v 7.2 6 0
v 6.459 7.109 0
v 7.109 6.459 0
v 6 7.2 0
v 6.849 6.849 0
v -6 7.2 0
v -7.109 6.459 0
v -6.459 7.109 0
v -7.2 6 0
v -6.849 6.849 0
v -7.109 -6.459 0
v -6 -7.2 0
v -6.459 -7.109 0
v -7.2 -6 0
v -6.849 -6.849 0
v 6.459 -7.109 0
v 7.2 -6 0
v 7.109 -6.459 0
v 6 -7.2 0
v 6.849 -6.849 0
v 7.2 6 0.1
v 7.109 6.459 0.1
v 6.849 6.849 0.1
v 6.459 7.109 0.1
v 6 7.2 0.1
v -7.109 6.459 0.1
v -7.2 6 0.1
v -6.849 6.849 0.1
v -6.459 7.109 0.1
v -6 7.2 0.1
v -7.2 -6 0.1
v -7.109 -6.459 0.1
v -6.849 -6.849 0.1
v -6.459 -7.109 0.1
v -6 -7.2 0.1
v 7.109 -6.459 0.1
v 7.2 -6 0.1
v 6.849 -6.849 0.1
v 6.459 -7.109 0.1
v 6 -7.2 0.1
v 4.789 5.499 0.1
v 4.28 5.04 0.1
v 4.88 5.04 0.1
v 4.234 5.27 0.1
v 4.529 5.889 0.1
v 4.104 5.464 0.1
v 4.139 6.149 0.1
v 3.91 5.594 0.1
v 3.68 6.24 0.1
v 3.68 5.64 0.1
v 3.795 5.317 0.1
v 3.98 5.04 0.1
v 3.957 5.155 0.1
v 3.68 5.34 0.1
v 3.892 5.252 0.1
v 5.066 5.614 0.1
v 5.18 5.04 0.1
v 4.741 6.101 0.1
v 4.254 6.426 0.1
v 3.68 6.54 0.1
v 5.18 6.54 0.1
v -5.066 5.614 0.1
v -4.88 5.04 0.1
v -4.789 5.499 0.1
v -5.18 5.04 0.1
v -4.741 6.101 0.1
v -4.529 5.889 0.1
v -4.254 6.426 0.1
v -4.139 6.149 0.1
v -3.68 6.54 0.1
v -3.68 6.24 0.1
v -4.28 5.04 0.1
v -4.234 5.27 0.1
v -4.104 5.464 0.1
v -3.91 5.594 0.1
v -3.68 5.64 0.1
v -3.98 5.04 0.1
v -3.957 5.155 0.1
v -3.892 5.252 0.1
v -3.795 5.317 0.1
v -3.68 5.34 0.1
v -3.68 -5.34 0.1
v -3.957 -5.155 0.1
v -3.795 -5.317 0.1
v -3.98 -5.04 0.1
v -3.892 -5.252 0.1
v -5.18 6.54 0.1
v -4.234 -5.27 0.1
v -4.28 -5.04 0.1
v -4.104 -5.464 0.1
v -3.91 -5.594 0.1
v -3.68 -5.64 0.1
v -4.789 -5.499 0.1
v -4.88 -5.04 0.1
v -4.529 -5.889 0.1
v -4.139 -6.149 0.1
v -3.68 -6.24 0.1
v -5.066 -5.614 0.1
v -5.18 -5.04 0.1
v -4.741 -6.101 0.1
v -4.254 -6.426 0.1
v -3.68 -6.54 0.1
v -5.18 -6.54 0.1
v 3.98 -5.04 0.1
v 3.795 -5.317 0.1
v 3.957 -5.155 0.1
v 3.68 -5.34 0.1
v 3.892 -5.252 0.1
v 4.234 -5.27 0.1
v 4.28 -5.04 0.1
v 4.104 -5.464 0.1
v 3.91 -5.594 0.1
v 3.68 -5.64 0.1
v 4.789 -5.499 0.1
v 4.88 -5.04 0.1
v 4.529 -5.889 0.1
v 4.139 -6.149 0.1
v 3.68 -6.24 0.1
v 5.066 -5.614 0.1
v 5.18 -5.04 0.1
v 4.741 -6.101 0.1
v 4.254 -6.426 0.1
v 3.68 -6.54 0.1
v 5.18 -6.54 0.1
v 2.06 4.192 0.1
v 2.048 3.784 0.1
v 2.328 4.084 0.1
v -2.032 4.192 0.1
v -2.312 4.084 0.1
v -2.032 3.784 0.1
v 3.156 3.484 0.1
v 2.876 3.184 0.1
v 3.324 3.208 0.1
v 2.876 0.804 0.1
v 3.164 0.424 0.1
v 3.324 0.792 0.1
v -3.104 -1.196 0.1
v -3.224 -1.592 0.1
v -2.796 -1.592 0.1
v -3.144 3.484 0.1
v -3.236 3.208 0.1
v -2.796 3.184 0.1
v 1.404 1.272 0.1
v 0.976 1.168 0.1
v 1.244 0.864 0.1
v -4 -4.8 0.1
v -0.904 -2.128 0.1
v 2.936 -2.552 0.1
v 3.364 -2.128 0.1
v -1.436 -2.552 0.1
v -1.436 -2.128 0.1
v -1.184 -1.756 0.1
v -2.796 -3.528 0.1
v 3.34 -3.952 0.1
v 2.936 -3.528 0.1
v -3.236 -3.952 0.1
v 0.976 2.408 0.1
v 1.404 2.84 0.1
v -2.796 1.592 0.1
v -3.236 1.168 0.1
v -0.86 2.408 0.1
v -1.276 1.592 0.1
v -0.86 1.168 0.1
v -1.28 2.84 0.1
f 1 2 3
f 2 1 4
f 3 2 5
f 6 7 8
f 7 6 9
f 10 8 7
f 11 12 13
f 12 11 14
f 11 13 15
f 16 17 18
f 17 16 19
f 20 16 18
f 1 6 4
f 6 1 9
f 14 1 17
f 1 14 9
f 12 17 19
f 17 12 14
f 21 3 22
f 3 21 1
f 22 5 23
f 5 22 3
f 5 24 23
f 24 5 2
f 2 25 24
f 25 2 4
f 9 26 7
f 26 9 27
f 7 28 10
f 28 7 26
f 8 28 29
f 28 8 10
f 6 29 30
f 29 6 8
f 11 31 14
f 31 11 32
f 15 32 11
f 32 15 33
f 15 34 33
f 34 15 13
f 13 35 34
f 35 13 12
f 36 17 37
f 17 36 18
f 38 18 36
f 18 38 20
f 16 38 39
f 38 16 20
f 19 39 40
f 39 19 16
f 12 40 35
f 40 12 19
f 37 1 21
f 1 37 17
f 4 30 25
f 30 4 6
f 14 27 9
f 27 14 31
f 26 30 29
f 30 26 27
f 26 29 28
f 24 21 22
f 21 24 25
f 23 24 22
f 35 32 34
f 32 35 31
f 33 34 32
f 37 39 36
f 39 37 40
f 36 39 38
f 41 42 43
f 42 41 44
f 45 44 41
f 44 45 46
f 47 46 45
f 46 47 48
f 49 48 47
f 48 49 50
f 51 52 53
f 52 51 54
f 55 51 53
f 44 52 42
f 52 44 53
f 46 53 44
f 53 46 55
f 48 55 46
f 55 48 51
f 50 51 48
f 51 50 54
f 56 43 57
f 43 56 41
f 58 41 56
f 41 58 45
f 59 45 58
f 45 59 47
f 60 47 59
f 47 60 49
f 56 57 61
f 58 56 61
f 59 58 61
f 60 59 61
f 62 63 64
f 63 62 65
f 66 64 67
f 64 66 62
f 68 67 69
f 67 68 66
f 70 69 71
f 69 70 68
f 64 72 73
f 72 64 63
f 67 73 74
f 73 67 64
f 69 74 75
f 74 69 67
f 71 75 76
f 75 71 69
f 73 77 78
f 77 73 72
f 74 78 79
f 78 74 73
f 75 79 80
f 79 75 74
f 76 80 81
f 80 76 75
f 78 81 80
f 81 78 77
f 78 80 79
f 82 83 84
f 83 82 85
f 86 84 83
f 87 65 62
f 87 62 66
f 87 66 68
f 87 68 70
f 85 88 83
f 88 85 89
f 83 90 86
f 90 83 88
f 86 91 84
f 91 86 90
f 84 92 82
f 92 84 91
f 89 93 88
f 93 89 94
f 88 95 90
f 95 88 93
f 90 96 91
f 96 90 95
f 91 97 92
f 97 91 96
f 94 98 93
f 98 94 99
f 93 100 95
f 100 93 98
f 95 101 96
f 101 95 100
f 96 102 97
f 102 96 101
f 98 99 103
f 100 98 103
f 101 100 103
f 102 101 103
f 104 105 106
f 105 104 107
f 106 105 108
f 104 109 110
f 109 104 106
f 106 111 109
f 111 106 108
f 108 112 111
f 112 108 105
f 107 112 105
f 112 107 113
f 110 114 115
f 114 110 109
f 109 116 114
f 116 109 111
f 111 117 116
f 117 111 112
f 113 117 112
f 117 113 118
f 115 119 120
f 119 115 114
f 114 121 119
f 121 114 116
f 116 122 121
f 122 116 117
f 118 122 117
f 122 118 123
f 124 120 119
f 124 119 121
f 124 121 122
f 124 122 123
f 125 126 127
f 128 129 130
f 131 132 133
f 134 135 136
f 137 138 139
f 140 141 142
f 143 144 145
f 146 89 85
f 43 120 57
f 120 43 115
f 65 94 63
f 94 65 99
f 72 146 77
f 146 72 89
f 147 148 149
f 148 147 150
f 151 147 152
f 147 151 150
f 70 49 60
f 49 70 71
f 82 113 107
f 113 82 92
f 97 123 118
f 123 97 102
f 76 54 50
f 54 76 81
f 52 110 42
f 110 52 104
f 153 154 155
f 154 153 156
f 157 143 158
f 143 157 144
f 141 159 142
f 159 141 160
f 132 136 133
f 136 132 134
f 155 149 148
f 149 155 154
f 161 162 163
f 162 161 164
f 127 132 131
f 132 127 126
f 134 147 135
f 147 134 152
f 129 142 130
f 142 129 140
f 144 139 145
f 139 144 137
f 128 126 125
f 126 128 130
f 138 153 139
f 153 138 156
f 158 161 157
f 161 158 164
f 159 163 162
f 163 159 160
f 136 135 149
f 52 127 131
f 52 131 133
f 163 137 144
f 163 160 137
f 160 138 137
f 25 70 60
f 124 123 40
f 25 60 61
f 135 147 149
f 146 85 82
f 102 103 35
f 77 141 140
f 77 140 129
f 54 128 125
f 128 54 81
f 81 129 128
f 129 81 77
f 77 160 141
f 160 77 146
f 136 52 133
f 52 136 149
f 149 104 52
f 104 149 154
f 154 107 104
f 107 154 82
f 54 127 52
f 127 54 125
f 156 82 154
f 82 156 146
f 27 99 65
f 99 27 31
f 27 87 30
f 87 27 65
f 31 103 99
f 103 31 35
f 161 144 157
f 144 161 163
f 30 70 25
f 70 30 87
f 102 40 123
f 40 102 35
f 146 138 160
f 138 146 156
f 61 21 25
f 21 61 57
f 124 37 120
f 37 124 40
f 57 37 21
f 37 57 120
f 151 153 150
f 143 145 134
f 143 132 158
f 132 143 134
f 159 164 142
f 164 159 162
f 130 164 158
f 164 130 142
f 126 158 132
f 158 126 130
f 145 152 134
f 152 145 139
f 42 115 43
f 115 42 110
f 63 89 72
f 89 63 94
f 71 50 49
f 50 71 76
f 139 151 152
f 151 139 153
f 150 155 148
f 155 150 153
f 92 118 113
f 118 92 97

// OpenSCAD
// file: ../p/1-4cyli.scad
use <../lib.scad>
function ldraw_lib__1_4cyli() = [
// 0 Cylinder 0.25
// 0 Name: 1-4cyli.dat
// 0 Author: James Jessiman
// 0 !LDRAW_ORG Primitive UPDATE 2012-01
// 0 !LICENSE Licensed under CC BY 4.0 : see CAreadme.txt
// 
// 0 BFC CERTIFY CCW
  [0,"BFC","CERTIFY"],
  [0,"BFC","CCW"],
// 
// 0 !HISTORY 2002-03-23 [sbliss] Added BFC statement.
// 0 !HISTORY 2002-04-25 [PTadmin] Official Update 2002-02
// 0 !HISTORY 2007-06-22 [PTadmin] Header formatted for Contributor Agreement
// 0 !HISTORY 2008-07-01 [PTadmin] Official Update 2008-01
// 0 !HISTORY 2012-02-16 [Philo] Changed to CCW
// 0 !HISTORY 2012-03-30 [PTadmin] Official Update 2012-01
// 
// 
// 4 16 1 1 0 0.9239 1 0.3827 0.9239 0 0.3827 1 0 0
  [4,16,1,1,0,0.9239,1,0.3827,0.9239,0,0.3827,1,0,0],
// 5 24 1 0 0 1 1 0 0.9239 0 0.3827 1 0 -1
  [5,24,1,0,0,1,1,0,0.9239,0,0.3827,1,0,-1],
// 4 16 0.9239 1 0.3827 0.7071 1 0.7071 0.7071 0 0.7071 0.9239 0 0.3827
  [4,16,0.9239,1,0.3827,0.7071,1,0.7071,0.7071,0,0.7071,0.9239,0,0.3827],
// 5 24 0.9239 0 0.3827 0.9239 1 0.3827 0.7071 0 0.7071 1 0 0
  [5,24,0.9239,0,0.3827,0.9239,1,0.3827,0.7071,0,0.7071,1,0,0],
// 4 16 0.7071 1 0.7071 0.3827 1 0.9239 0.3827 0 0.9239 0.7071 0 0.7071
  [4,16,0.7071,1,0.7071,0.3827,1,0.9239,0.3827,0,0.9239,0.7071,0,0.7071],
// 5 24 0.7071 0 0.7071 0.7071 1 0.7071 0.3827 0 0.9239 0.9239 0 0.3827
  [5,24,0.7071,0,0.7071,0.7071,1,0.7071,0.3827,0,0.9239,0.9239,0,0.3827],
// 4 16 0.3827 1 0.9239 0 1 1 0 0 1 0.3827 0 0.9239
  [4,16,0.3827,1,0.9239,0,1,1,0,0,1,0.3827,0,0.9239],
// 5 24 0.3827 0 0.9239 0.3827 1 0.9239 0 0 1 0.7071 0 0.7071
  [5,24,0.3827,0,0.9239,0.3827,1,0.9239,0,0,1,0.7071,0,0.7071],
// 5 24 0 0 1 0 1 1 0.3827 0 0.9239 -1 0 1
  [5,24,0,0,1,0,1,1,0.3827,0,0.9239,-1,0,1],
];
module ldraw_lib__1_4cyli(step=0, col=false, unit=2/5, alt=false, line=0.2, solid=!$preview)
    makepoly(ldraw_lib__1_4cyli(), step=step, col=col, unit=unit, alt=alt, line=line, solid=solid);
ldraw_lib__1_4cyli(line=0.2);
// file: s/6237277as01.scad
use <../../lib.scad>
use <../../p/1-4chrd.scad>
use <../../p/1-4cyli.scad>
function ldraw_lib__s__6237277as01() = [
// 0 ~Sticker  1.8 x  1.8 without Top Surface
// 0 Name: s\6237277as01.dat
// 0 Author: Alex Herrera [alanbrito98]
// 0 !LDRAW_ORG Subpart UPDATE 2023-04
// 0 !LICENSE Licensed under CC BY 4.0 : see CAreadme.txt
// 
// 0 BFC CERTIFY CCW
  [0,"BFC","CERTIFY"],
  [0,"BFC","CCW"],
// 
// 0 !HISTORY 2023-08-25 [OrionP] Official Update 2023-04
// 
// 
// 0 // Bottom
// 0 // Primitives
// 1 16 15 0 15 3 0 0 0 -1 0 0 0 3 1-4chrd.dat
  [1,16,15,0,15,3,0,0,0,-1,0,0,0,3, ldraw_lib__1_4chrd()],
// 1 16 -15 0 15 -3 0 0 0 -1 0 0 0 3 1-4chrd.dat
  [1,16,-15,0,15,-3,0,0,0,-1,0,0,0,3, ldraw_lib__1_4chrd()],
// 1 16 -15 0 -15 -3 0 0 0 -1 0 0 0 -3 1-4chrd.dat
  [1,16,-15,0,-15,-3,0,0,0,-1,0,0,0,-3, ldraw_lib__1_4chrd()],
// 1 16 15 0 -15 3 0 0 0 -1 0 0 0 -3 1-4chrd.dat
  [1,16,15,0,-15,3,0,0,0,-1,0,0,0,-3, ldraw_lib__1_4chrd()],
// 0 // Bottom Faces
// 4 16 18 0 15 -18 0 15 -15 0 18 15 0 18
  [4,16,18,0,15,-18,0,15,-15,0,18,15,0,18],
// 4 16 -18 0 -15 -18 0 15 18 0 15 18 0 -15
  [4,16,-18,0,-15,-18,0,15,18,0,15,18,0,-15],
// 4 16 15 0 -18 -15 0 -18 -18 0 -15 18 0 -15
  [4,16,15,0,-18,-15,0,-18,-18,0,-15,18,0,-15],
// 0 // Sides
// 0 // Primitives
// 1 16 15 0 15 3 0 0 0 -0.25 0 0 0 3 1-4cyli.dat
  [1,16,15,0,15,3,0,0,0,-0.25,0,0,0,3, ldraw_lib__1_4cyli()],
// 1 16 -15 0 15 -3 0 0 0 -0.25 0 0 0 3 1-4cyli.dat
  [1,16,-15,0,15,-3,0,0,0,-0.25,0,0,0,3, ldraw_lib__1_4cyli()],
// 1 16 -15 0 -15 -3 0 0 0 -0.25 0 0 0 -3 1-4cyli.dat
  [1,16,-15,0,-15,-3,0,0,0,-0.25,0,0,0,-3, ldraw_lib__1_4cyli()],
// 1 16 15 0 -15 3 0 0 0 -0.25 0 0 0 -3 1-4cyli.dat
  [1,16,15,0,-15,3,0,0,0,-0.25,0,0,0,-3, ldraw_lib__1_4cyli()],
// 0 // Side Faces
// 4 16 -15 0 -18 15 0 -18 15 -0.25 -18 -15 -0.25 -18
  [4,16,-15,0,-18,15,0,-18,15,-0.25,-18,-15,-0.25,-18],
// 4 16 18 0 -15 18 0 15 18 -0.25 15 18 -0.25 -15
  [4,16,18,0,-15,18,0,15,18,-0.25,15,18,-0.25,-15],
// 4 16 15 0 18 -15 0 18 -15 -0.25 18 15 -0.25 18
  [4,16,15,0,18,-15,0,18,-15,-0.25,18,15,-0.25,18],
// 4 16 -18 0 15 -18 0 -15 -18 -0.25 -15 -18 -0.25 15
  [4,16,-18,0,15,-18,0,-15,-18,-0.25,-15,-18,-0.25,15],
// 
];
module ldraw_lib__s__6237277as01(step=0, col=false, unit=2/5, alt=false, line=0.2, solid=!$preview)
    makepoly(ldraw_lib__s__6237277as01(), step=step, col=col, unit=unit, alt=alt, line=line, solid=solid);
ldraw_lib__s__6237277as01(line=0.2);
// file: ../p/1-4ring4.scad
use <../lib.scad>
function ldraw_lib__1_4ring4() = [
// 0 Ring  4 x 0.25
// 0 Name: 1-4ring4.dat
// 0 Author: Bernd Broich [bbroich]
// 0 !LDRAW_ORG Primitive UPDATE 2012-01
// 0 !LICENSE Licensed under CC BY 2.0 and CC BY 4.0 : see CAreadme.txt
// 
// 0 BFC CERTIFY CCW
  [0,"BFC","CERTIFY"],
  [0,"BFC","CCW"],
// 
// 0 !HISTORY 2000-09-30 [PTadmin] Official Update 2000-02
// 0 !HISTORY 2003-08-01 [PTadmin] Official Update 2003-02
// 0 !HISTORY 2007-06-22 [PTadmin] Header formatted for Contributor Agreement
// 0 !HISTORY 2008-07-01 [PTadmin] Official Update 2008-01
// 0 !HISTORY 2012-02-16 [Philo] Changed to CCW
// 0 !HISTORY 2012-03-30 [PTadmin] Official Update 2012-01
// 
// 
// 4 16 5 0 0 4.6195 0 1.9135 3.6956 0 1.5308 4 0 0
  [4,16,5,0,0,4.6195,0,1.9135,3.6956,0,1.5308,4,0,0],
// 4 16 4.6195 0 1.9135 3.5355 0 3.5355 2.8284 0 2.8284 3.6956 0 1.5308
  [4,16,4.6195,0,1.9135,3.5355,0,3.5355,2.8284,0,2.8284,3.6956,0,1.5308],
// 4 16 3.5355 0 3.5355 1.9135 0 4.6195 1.5308 0 3.6956 2.8284 0 2.8284
  [4,16,3.5355,0,3.5355,1.9135,0,4.6195,1.5308,0,3.6956,2.8284,0,2.8284],
// 4 16 1.9135 0 4.6195 0 0 5 0 0 4 1.5308 0 3.6956
  [4,16,1.9135,0,4.6195,0,0,5,0,0,4,1.5308,0,3.6956],
];
module ldraw_lib__1_4ring4(step=0, col=false, unit=2/5, alt=false, line=0.2, solid=!$preview)
    makepoly(ldraw_lib__1_4ring4(), step=step, col=col, unit=unit, alt=alt, line=line, solid=solid);
ldraw_lib__1_4ring4(line=0.2);
// file: ../p/1-4ring1.scad
use <../lib.scad>
function ldraw_lib__1_4ring1() = [
// 0 Ring  1 x 0.25
// 0 Name: 1-4ring1.dat
// 0 Author: Chris Dee [cwdee]
// 0 !LDRAW_ORG Primitive UPDATE 2012-01
// 0 !LICENSE Licensed under CC BY 4.0 : see CAreadme.txt
// 
// 0 BFC CERTIFY CCW
  [0,"BFC","CERTIFY"],
  [0,"BFC","CCW"],
// 
// 0 !HISTORY 2000-05-07 [PTadmin] Official Update 2000-01
// 0 !HISTORY 2002-11-22 [hafhead] Added BFC statement
// 0 !HISTORY 2002-11-30 [PTadmin] Official Update 2002-05
// 0 !HISTORY 2007-06-22 [PTadmin] Header formatted for Contributor Agreement
// 0 !HISTORY 2008-07-01 [PTadmin] Official Update 2008-01
// 0 !HISTORY 2012-02-16 [Philo] Changed to CCW
// 0 !HISTORY 2012-03-30 [PTadmin] Official Update 2012-01
// 
// 
// 4 16 2 0 0 1.8478 0 0.7654 0.9239 0 0.3827 1 0 0
  [4,16,2,0,0,1.8478,0,0.7654,0.9239,0,0.3827,1,0,0],
// 4 16 1.8478 0 0.7654 1.4142 0 1.4142 0.7071 0 0.7071 0.9239 0 0.3827
  [4,16,1.8478,0,0.7654,1.4142,0,1.4142,0.7071,0,0.7071,0.9239,0,0.3827],
// 4 16 1.4142 0 1.4142 0.7654 0 1.8478 0.3827 0 0.9239 0.7071 0 0.7071
  [4,16,1.4142,0,1.4142,0.7654,0,1.8478,0.3827,0,0.9239,0.7071,0,0.7071],
// 4 16 0.7654 0 1.8478 0 0 2 0 0 1 0.3827 0 0.9239
  [4,16,0.7654,0,1.8478,0,0,2,0,0,1,0.3827,0,0.9239],
];
module ldraw_lib__1_4ring1(step=0, col=false, unit=2/5, alt=false, line=0.2, solid=!$preview)
    makepoly(ldraw_lib__1_4ring1(), step=step, col=col, unit=unit, alt=alt, line=line, solid=solid);
ldraw_lib__1_4ring1(line=0.2);
// file: ../p/1-4ndis.scad
use <../lib.scad>
function ldraw_lib__1_4ndis() = [
// 0 Disc Negative 0.25
// 0 Name: 1-4ndis.dat
// 0 Author: James Jessiman
// 0 !LDRAW_ORG Primitive UPDATE 2012-01
// 0 !LICENSE Licensed under CC BY 4.0 : see CAreadme.txt
// 
// 0 BFC CERTIFY CCW
  [0,"BFC","CERTIFY"],
  [0,"BFC","CCW"],
// 
// 0 !HISTORY 2002-03-23 [sbliss] Added BFC Statement
// 0 !HISTORY 2002-04-25 [PTadmin] Official Update 2002-02
// 0 !HISTORY 2007-06-22 [PTadmin] Header formatted for Contributor Agreement
// 0 !HISTORY 2008-07-01 [PTadmin] Official Update 2008-01
// 0 !HISTORY 2012-02-16 [Philo] Changed to CCW
// 0 !HISTORY 2012-03-30 [PTadmin] Official Update 2012-01
// 
// 
// 3 16 0.9239 0 0.3827 1 0 0 1 0 1
  [3,16,0.9239,0,0.3827,1,0,0,1,0,1],
// 3 16 0.7071 0 0.7071 0.9239 0 0.3827 1 0 1
  [3,16,0.7071,0,0.7071,0.9239,0,0.3827,1,0,1],
// 3 16 0.3827 0 0.9239 0.7071 0 0.7071 1 0 1
  [3,16,0.3827,0,0.9239,0.7071,0,0.7071,1,0,1],
// 3 16 0 0 1 0.3827 0 0.9239 1 0 1
  [3,16,0,0,1,0.3827,0,0.9239,1,0,1],
];
module ldraw_lib__1_4ndis(step=0, col=false, unit=2/5, alt=false, line=0.2, solid=!$preview)
    makepoly(ldraw_lib__1_4ndis(), step=step, col=col, unit=unit, alt=alt, line=line, solid=solid);
ldraw_lib__1_4ndis(line=0.2);
// file: ../p/1-4chrd.scad
use <../lib.scad>
function ldraw_lib__1_4chrd() = [
// 0 Chord 0.25
// 0 Name: 1-4chrd.dat
// 0 Author: Tony Hafner [hafhead]
// 0 !LDRAW_ORG Primitive UPDATE 2012-02
// 0 !LICENSE Licensed under CC BY 2.0 and CC BY 4.0 : see CAreadme.txt
// 
// 0 BFC CERTIFY CCW
  [0,"BFC","CERTIFY"],
  [0,"BFC","CCW"],
// 
// 0 !HISTORY 2004-04-22 [PTadmin] Official Update 2004-02
// 0 !HISTORY 2007-10-09 [PTadmin] Header formatted for Contributor Agreement
// 0 !HISTORY 2008-07-01 [PTadmin] Official Update 2008-01
// 0 !HISTORY 2012-08-02 [MMR1988] Re-creation with PrimGen2 and Rectifier
// 0 !HISTORY 2012-08-09 [PTadmin] Official Update 2012-02
// 
// 
// 4 16 0.9239 0 0.3827 0.3827 0 0.9239 0 0 1 1 0 0
  [4,16,0.9239,0,0.3827,0.3827,0,0.9239,0,0,1,1,0,0],
// 3 16 0.7071 0 0.7071 0.3827 0 0.9239 0.9239 0 0.3827
  [3,16,0.7071,0,0.7071,0.3827,0,0.9239,0.9239,0,0.3827],
];
module ldraw_lib__1_4chrd(step=0, col=false, unit=2/5, alt=false, line=0.2, solid=!$preview)
    makepoly(ldraw_lib__1_4chrd(), step=step, col=col, unit=unit, alt=alt, line=line, solid=solid);
ldraw_lib__1_4chrd(line=0.2);
// main file
use <../lib.scad>
use <../p/1-4chrd.scad>
use <../p/1-4ndis.scad>
use <../p/1-4ring1.scad>
use <../p/1-4ring4.scad>
use <s/6237277as01.scad>
function ldraw_lib__6237277b() = [
// 0 Sticker  1.8 x  1.8 with Yellow "2" on Blue Panel on Blue Background
// 0 Name: 6237277b.dat
// 0 Author: Alex Herrera [alanbrito98]
// 0 !LDRAW_ORG Part UPDATE 2023-04
// 0 !LICENSE Licensed under CC BY 4.0 : see CAreadme.txt
// 
// 0 BFC CERTIFY CCW
  [0,"BFC","CERTIFY"],
  [0,"BFC","CCW"],
// 
// 0 !KEYWORDS set 21311, Voltron
// 
// 0 !HISTORY 2023-08-25 [OrionP] Official Update 2023-04
// 
// 
// 0 // Box
// 
// 1 16 0 0 0 1 0 0 0 1 0 0 0 1 s\6237277as01.dat
  [1,16,0,0,0,1,0,0,0,1,0,0,0,1, ldraw_lib__s__6237277as01()],
// 0 // Primitives
// 1 1 -15 -0.25 15 -3 0 0 0 1 0 0 0 3 1-4chrd.dat
  [1,1,-15,-0.25,15,-3,0,0,0,1,0,0,0,3, ldraw_lib__1_4chrd()],
// 1 1 15 -0.25 15 3 0 0 0 1 0 0 0 3 1-4chrd.dat
  [1,1,15,-0.25,15,3,0,0,0,1,0,0,0,3, ldraw_lib__1_4chrd()],
// 1 1 -15 -0.25 -15 -3 0 0 0 1 0 0 0 -3 1-4chrd.dat
  [1,1,-15,-0.25,-15,-3,0,0,0,1,0,0,0,-3, ldraw_lib__1_4chrd()],
// 1 1 15 -0.25 -15 3 0 0 0 1 0 0 0 -3 1-4chrd.dat
  [1,1,15,-0.25,-15,3,0,0,0,1,0,0,0,-3, ldraw_lib__1_4chrd()],
// 1 14 9.2 -0.25 12.6 1.5 0 0 0 1 0 0 0 1.5 1-4ring1.dat
  [1,14,9.2,-0.25,12.6,1.5,0,0,0,1,0,0,0,1.5, ldraw_lib__1_4ring1()],
// 1 1 9.2 -0.25 12.6 0.75 0 0 0 1 0 0 0 0.75 1-4chrd.dat
  [1,1,9.2,-0.25,12.6,0.75,0,0,0,1,0,0,0,0.75, ldraw_lib__1_4chrd()],
// 1 0 9.2 -0.25 12.6 0.75 0 0 0 1 0 0 0 0.75 1-4ring1.dat
  [1,0,9.2,-0.25,12.6,0.75,0,0,0,1,0,0,0,0.75, ldraw_lib__1_4ring1()],
// 1 0 9.2 -0.25 12.6 0.75 0 0 0 1 0 0 0 0.75 1-4ring4.dat
  [1,0,9.2,-0.25,12.6,0.75,0,0,0,1,0,0,0,0.75, ldraw_lib__1_4ring4()],
// 1 1 9.2 -0.25 12.6 3.75 0 0 0 1 0 0 0 3.75 1-4ndis.dat
  [1,1,9.2,-0.25,12.6,3.75,0,0,0,1,0,0,0,3.75, ldraw_lib__1_4ndis()],
// 1 0 -9.2 -0.25 12.6 -0.75 0 0 0 1 0 0 0 0.75 1-4ring4.dat
  [1,0,-9.2,-0.25,12.6,-0.75,0,0,0,1,0,0,0,0.75, ldraw_lib__1_4ring4()],
// 1 14 -9.2 -0.25 12.6 -1.5 0 0 0 1 0 0 0 1.5 1-4ring1.dat
  [1,14,-9.2,-0.25,12.6,-1.5,0,0,0,1,0,0,0,1.5, ldraw_lib__1_4ring1()],
// 1 0 -9.2 -0.25 12.6 -0.75 0 0 0 1 0 0 0 0.75 1-4ring1.dat
  [1,0,-9.2,-0.25,12.6,-0.75,0,0,0,1,0,0,0,0.75, ldraw_lib__1_4ring1()],
// 1 1 -9.2 -0.25 12.6 -0.75 0 0 0 1 0 0 0 0.75 1-4chrd.dat
  [1,1,-9.2,-0.25,12.6,-0.75,0,0,0,1,0,0,0,0.75, ldraw_lib__1_4chrd()],
// 1 1 -9.2 -0.25 -12.6 -0.75 0 0 0 1 0 0 0 -0.75 1-4chrd.dat
  [1,1,-9.2,-0.25,-12.6,-0.75,0,0,0,1,0,0,0,-0.75, ldraw_lib__1_4chrd()],
// 1 1 -9.2 -0.25 12.6 -3.75 0 0 0 1 0 0 0 3.75 1-4ndis.dat
  [1,1,-9.2,-0.25,12.6,-3.75,0,0,0,1,0,0,0,3.75, ldraw_lib__1_4ndis()],
// 1 0 -9.2 -0.25 -12.6 -0.75 0 0 0 1 0 0 0 -0.75 1-4ring1.dat
  [1,0,-9.2,-0.25,-12.6,-0.75,0,0,0,1,0,0,0,-0.75, ldraw_lib__1_4ring1()],
// 1 14 -9.2 -0.25 -12.6 -1.5 0 0 0 1 0 0 0 -1.5 1-4ring1.dat
  [1,14,-9.2,-0.25,-12.6,-1.5,0,0,0,1,0,0,0,-1.5, ldraw_lib__1_4ring1()],
// 1 0 -9.2 -0.25 -12.6 -0.75 0 0 0 1 0 0 0 -0.75 1-4ring4.dat
  [1,0,-9.2,-0.25,-12.6,-0.75,0,0,0,1,0,0,0,-0.75, ldraw_lib__1_4ring4()],
// 1 1 -9.2 -0.25 -12.6 -3.75 0 0 0 1 0 0 0 -3.75 1-4ndis.dat
  [1,1,-9.2,-0.25,-12.6,-3.75,0,0,0,1,0,0,0,-3.75, ldraw_lib__1_4ndis()],
// 1 1 9.2 -0.25 -12.6 0.75 0 0 0 1 0 0 0 -0.75 1-4chrd.dat
  [1,1,9.2,-0.25,-12.6,0.75,0,0,0,1,0,0,0,-0.75, ldraw_lib__1_4chrd()],
// 1 0 9.2 -0.25 -12.6 0.75 0 0 0 1 0 0 0 -0.75 1-4ring1.dat
  [1,0,9.2,-0.25,-12.6,0.75,0,0,0,1,0,0,0,-0.75, ldraw_lib__1_4ring1()],
// 1 14 9.2 -0.25 -12.6 1.5 0 0 0 1 0 0 0 -1.5 1-4ring1.dat
  [1,14,9.2,-0.25,-12.6,1.5,0,0,0,1,0,0,0,-1.5, ldraw_lib__1_4ring1()],
// 1 0 9.2 -0.25 -12.6 0.75 0 0 0 1 0 0 0 -0.75 1-4ring4.dat
  [1,0,9.2,-0.25,-12.6,0.75,0,0,0,1,0,0,0,-0.75, ldraw_lib__1_4ring4()],
// 1 1 9.2 -0.25 -12.6 3.75 0 0 0 1 0 0 0 -3.75 1-4ndis.dat
  [1,1,9.2,-0.25,-12.6,3.75,0,0,0,1,0,0,0,-3.75, ldraw_lib__1_4ndis()],
// 0 // Pattern
// 0 // Black
// 3 0 5.15 -0.25 10.48 5.12 -0.25 9.46 5.82 -0.25 10.21
  [3,0,5.15,-0.25,10.48,5.12,-0.25,9.46,5.82,-0.25,10.21],
// 3 0 -5.08 -0.25 10.48 -5.78 -0.25 10.21 -5.08 -0.25 9.46
  [3,0,-5.08,-0.25,10.48,-5.78,-0.25,10.21,-5.08,-0.25,9.46],
// 3 0 7.89 -0.25 8.71 7.19 -0.25 7.96 8.31 -0.25 8.02
  [3,0,7.89,-0.25,8.71,7.19,-0.25,7.96,8.31,-0.25,8.02],
// 3 0 7.19 -0.25 2.01 7.91 -0.25 1.06 8.31 -0.25 1.98
  [3,0,7.19,-0.25,2.01,7.91,-0.25,1.06,8.31,-0.25,1.98],
// 3 0 -7.76 -0.25 -2.99 -8.06 -0.25 -3.98 -6.99 -0.25 -3.98
  [3,0,-7.76,-0.25,-2.99,-8.06,-0.25,-3.98,-6.99,-0.25,-3.98],
// 3 0 -7.86 -0.25 8.71 -8.09 -0.25 8.02 -6.99 -0.25 7.96
  [3,0,-7.86,-0.25,8.71,-8.09,-0.25,8.02,-6.99,-0.25,7.96],
// 3 0 3.51 -0.25 3.18 2.44 -0.25 2.92 3.11 -0.25 2.16
  [3,0,3.51,-0.25,3.18,2.44,-0.25,2.92,3.11,-0.25,2.16],
// 3 0 -10 -0.25 -12 -10.7 -0.25 -12.6 -9.95 -0.25 -12.6
  [3,0,-10,-0.25,-12,-10.7,-0.25,-12.6,-9.95,-0.25,-12.6],
// 4 0 12.2 -0.25 12.6 12.2 -0.25 -12.6 12.95 -0.25 -12.6 12.95 -0.25 12.6
  [4,0,12.2,-0.25,12.6,12.2,-0.25,-12.6,12.95,-0.25,-12.6,12.95,-0.25,12.6],
// 4 0 -12.2 -0.25 12.6 -12.95 -0.25 12.6 -12.95 -0.25 -12.6 -12.2 -0.25 -12.6
  [4,0,-12.2,-0.25,12.6,-12.95,-0.25,12.6,-12.95,-0.25,-12.6,-12.2,-0.25,-12.6],
// 4 0 -10 -0.25 -12 -9.95 -0.25 12.6 -10.7 -0.25 12.6 -10.7 -0.25 -12.6
  [4,0,-10,-0.25,-12,-9.95,-0.25,12.6,-10.7,-0.25,12.6,-10.7,-0.25,-12.6],
// 4 0 8.41 -0.25 -5.32 -2.26 -0.25 -5.32 -3.59 -0.25 -6.38 7.34 -0.25 -6.38
  [4,0,8.41,-0.25,-5.32,-2.26,-0.25,-5.32,-3.59,-0.25,-6.38,7.34,-0.25,-6.38],
// 4 0 -2.26 -0.25 -5.32 -2.96 -0.25 -4.39 -3.59 -0.25 -5.32 -3.59 -0.25 -6.38
  [4,0,-2.26,-0.25,-5.32,-2.96,-0.25,-4.39,-3.59,-0.25,-5.32,-3.59,-0.25,-6.38],
// 4 0 9.2 -0.25 15.6 9.2 -0.25 16.35 -9.2 -0.25 16.35 -9.2 -0.25 15.6
  [4,0,9.2,-0.25,15.6,9.2,-0.25,16.35,-9.2,-0.25,16.35,-9.2,-0.25,15.6],
// 4 0 9.2 -0.25 -13.35 -9.2 -0.25 -13.35 -9.2 -0.25 -14.1 9.2 -0.25 -14.1
  [4,0,9.2,-0.25,-13.35,-9.2,-0.25,-13.35,-9.2,-0.25,-14.1,9.2,-0.25,-14.1],
// 4 0 -9.2 -0.25 -16.35 9.2 -0.25 -16.35 9.2 -0.25 -15.6 -9.2 -0.25 -15.6
  [4,0,-9.2,-0.25,-16.35,9.2,-0.25,-16.35,9.2,-0.25,-15.6,-9.2,-0.25,-15.6],
// 4 0 9.2 -0.25 13.35 9.2 -0.25 14.1 -9.2 -0.25 14.1 -9.2 -0.25 13.35
  [4,0,9.2,-0.25,13.35,9.2,-0.25,14.1,-9.2,-0.25,14.1,-9.2,-0.25,13.35],
// 4 0 10.7 -0.25 -12.6 10.7 -0.25 12.6 9.95 -0.25 12.6 9.95 -0.25 -12.6
  [4,0,10.7,-0.25,-12.6,10.7,-0.25,12.6,9.95,-0.25,12.6,9.95,-0.25,-12.6],
// 4 0 -6.99 -0.25 -8.82 -8.09 -0.25 -9.88 8.35 -0.25 -9.88 7.34 -0.25 -8.82
  [4,0,-6.99,-0.25,-8.82,-8.09,-0.25,-9.88,8.35,-0.25,-9.88,7.34,-0.25,-8.82],
// 4 0 3.51 -0.25 7.1 2.44 -0.25 6.02 2.44 -0.25 2.92 3.51 -0.25 3.18
  [4,0,3.51,-0.25,7.1,2.44,-0.25,6.02,2.44,-0.25,2.92,3.51,-0.25,3.18],
// 4 0 -6.99 -0.25 7.96 -8.09 -0.25 8.02 -8.09 -0.25 2.92 -6.99 -0.25 3.98
  [4,0,-6.99,-0.25,7.96,-8.09,-0.25,8.02,-8.09,-0.25,2.92,-6.99,-0.25,3.98],
// 4 0 8.31 -0.25 8.02 7.19 -0.25 7.96 7.19 -0.25 2.01 8.31 -0.25 1.98
  [4,0,8.31,-0.25,8.02,7.19,-0.25,7.96,7.19,-0.25,2.01,8.31,-0.25,1.98],
// 4 0 8.41 -0.25 -5.32 7.34 -0.25 -6.38 7.34 -0.25 -8.82 8.35 -0.25 -9.88
  [4,0,8.41,-0.25,-5.32,7.34,-0.25,-6.38,7.34,-0.25,-8.82,8.35,-0.25,-9.88],
// 4 0 -2.15 -0.25 6.02 -3.2 -0.25 7.1 -3.19 -0.25 3.98 -2.15 -0.25 2.92
  [4,0,-2.15,-0.25,6.02,-3.2,-0.25,7.1,-3.19,-0.25,3.98,-2.15,-0.25,2.92],
// 4 0 7.89 -0.25 8.71 5.82 -0.25 10.21 5.12 -0.25 9.46 7.19 -0.25 7.96
  [4,0,7.89,-0.25,8.71,5.82,-0.25,10.21,5.12,-0.25,9.46,7.19,-0.25,7.96],
// 4 0 7.91 -0.25 1.06 7.19 -0.25 2.01 -2.96 -0.25 -4.39 -2.26 -0.25 -5.32
  [4,0,7.91,-0.25,1.06,7.19,-0.25,2.01,-2.96,-0.25,-4.39,-2.26,-0.25,-5.32],
// 4 0 -5.08 -0.25 9.46 -5.78 -0.25 10.21 -7.86 -0.25 8.71 -6.99 -0.25 7.96
  [4,0,-5.08,-0.25,9.46,-5.78,-0.25,10.21,-7.86,-0.25,8.71,-6.99,-0.25,7.96],
// 4 0 3.11 -0.25 2.16 2.44 -0.25 2.92 -7.76 -0.25 -2.99 -6.99 -0.25 -3.98
  [4,0,3.11,-0.25,2.16,2.44,-0.25,2.92,-7.76,-0.25,-2.99,-6.99,-0.25,-3.98],
// 4 0 -5.08 -0.25 10.48 -5.08 -0.25 9.46 5.12 -0.25 9.46 5.15 -0.25 10.48
  [4,0,-5.08,-0.25,10.48,-5.08,-0.25,9.46,5.12,-0.25,9.46,5.15,-0.25,10.48],
// 4 0 -8.09 -0.25 -9.88 -6.99 -0.25 -8.82 -6.99 -0.25 -3.98 -8.06 -0.25 -3.98
  [4,0,-8.09,-0.25,-9.88,-6.99,-0.25,-8.82,-6.99,-0.25,-3.98,-8.06,-0.25,-3.98],
// 4 0 -3.2 -0.25 7.1 -2.15 -0.25 6.02 2.44 -0.25 6.02 3.51 -0.25 7.1
  [4,0,-3.2,-0.25,7.1,-2.15,-0.25,6.02,2.44,-0.25,6.02,3.51,-0.25,7.1],
// 4 0 -6.99 -0.25 3.98 -8.09 -0.25 2.92 -2.15 -0.25 2.92 -3.19 -0.25 3.98
  [4,0,-6.99,-0.25,3.98,-8.09,-0.25,2.92,-2.15,-0.25,2.92,-3.19,-0.25,3.98],
// 0 // Blue
// 3 1 8.31 -0.25 1.98 7.91 -0.25 1.06 8.41 -0.25 -5.32
  [3,1,8.31,-0.25,1.98,7.91,-0.25,1.06,8.41,-0.25,-5.32],
// 3 1 9.95 -0.25 12.6 5.82 -0.25 10.21 7.89 -0.25 8.71
  [3,1,9.95,-0.25,12.6,5.82,-0.25,10.21,7.89,-0.25,8.71],
// 3 1 9.95 -0.25 12.6 7.89 -0.25 8.71 8.31 -0.25 8.02
  [3,1,9.95,-0.25,12.6,7.89,-0.25,8.71,8.31,-0.25,8.02],
// 3 1 -2.15 -0.25 2.92 -7.76 -0.25 -2.99 2.44 -0.25 2.92
  [3,1,-2.15,-0.25,2.92,-7.76,-0.25,-2.99,2.44,-0.25,2.92],
// 3 1 -2.15 -0.25 2.92 -8.09 -0.25 2.92 -7.76 -0.25 -2.99
  [3,1,-2.15,-0.25,2.92,-8.09,-0.25,2.92,-7.76,-0.25,-2.99],
// 3 1 -8.09 -0.25 2.92 -8.06 -0.25 -3.98 -7.76 -0.25 -2.99
  [3,1,-8.09,-0.25,2.92,-8.06,-0.25,-3.98,-7.76,-0.25,-2.99],
// 3 1 15 -0.25 18 -9.2 -0.25 16.35 9.2 -0.25 16.35
  [3,1,15,-0.25,18,-9.2,-0.25,16.35,9.2,-0.25,16.35],
// 3 1 12.95 -0.25 -16.35 9.2 -0.25 -16.35 15 -0.25 -18
  [3,1,12.95,-0.25,-16.35,9.2,-0.25,-16.35,15,-0.25,-18],
// 3 1 15 -0.25 18 9.2 -0.25 16.35 12.95 -0.25 16.35
  [3,1,15,-0.25,18,9.2,-0.25,16.35,12.95,-0.25,16.35],
// 3 1 7.91 -0.25 1.06 -2.26 -0.25 -5.32 8.41 -0.25 -5.32
  [3,1,7.91,-0.25,1.06,-2.26,-0.25,-5.32,8.41,-0.25,-5.32],
// 3 1 -10 -0.25 -12 -9.95 -0.25 -12.6 -9.2 -0.25 -13.35
  [3,1,-10,-0.25,-12,-9.95,-0.25,-12.6,-9.2,-0.25,-13.35],
// 3 1 -9.2 -0.25 -16.35 -12.95 -0.25 -16.35 -15 -0.25 -18
  [3,1,-9.2,-0.25,-16.35,-12.95,-0.25,-16.35,-15,-0.25,-18],
// 3 1 -9.95 -0.25 12.6 -8.09 -0.25 8.02 -7.86 -0.25 8.71
  [3,1,-9.95,-0.25,12.6,-8.09,-0.25,8.02,-7.86,-0.25,8.71],
// 3 1 -9.95 -0.25 12.6 -7.86 -0.25 8.71 -5.78 -0.25 10.21
  [3,1,-9.95,-0.25,12.6,-7.86,-0.25,8.71,-5.78,-0.25,10.21],
// 4 1 -9.2 -0.25 13.35 -5.08 -0.25 10.48 5.15 -0.25 10.48 9.2 -0.25 13.35
  [4,1,-9.2,-0.25,13.35,-5.08,-0.25,10.48,5.15,-0.25,10.48,9.2,-0.25,13.35],
// 4 1 -5.08 -0.25 10.48 -9.2 -0.25 13.35 -9.95 -0.25 12.6 -5.78 -0.25 10.21
  [4,1,-5.08,-0.25,10.48,-9.2,-0.25,13.35,-9.95,-0.25,12.6,-5.78,-0.25,10.21],
// 4 1 -10 -0.25 -12 -8.09 -0.25 2.92 -8.09 -0.25 8.02 -9.95 -0.25 12.6
  [4,1,-10,-0.25,-12,-8.09,-0.25,2.92,-8.09,-0.25,8.02,-9.95,-0.25,12.6],
// 4 1 8.31 -0.25 1.98 8.41 -0.25 -5.32 9.95 -0.25 12.6 8.31 -0.25 8.02
  [4,1,8.31,-0.25,1.98,8.41,-0.25,-5.32,9.95,-0.25,12.6,8.31,-0.25,8.02],
// 4 1 8.41 -0.25 -5.32 8.35 -0.25 -9.88 9.95 -0.25 -12.6 9.95 -0.25 12.6
  [4,1,8.41,-0.25,-5.32,8.35,-0.25,-9.88,9.95,-0.25,-12.6,9.95,-0.25,12.6],
// 4 1 -9.2 -0.25 -13.35 9.2 -0.25 -13.35 9.95 -0.25 -12.6 8.35 -0.25 -9.88
  [4,1,-9.2,-0.25,-13.35,9.2,-0.25,-13.35,9.95,-0.25,-12.6,8.35,-0.25,-9.88],
// 4 1 9.95 -0.25 12.6 9.2 -0.25 13.35 5.15 -0.25 10.48 5.82 -0.25 10.21
  [4,1,9.95,-0.25,12.6,9.2,-0.25,13.35,5.15,-0.25,10.48,5.82,-0.25,10.21],
// 4 1 -8.09 -0.25 -9.88 -10 -0.25 -12 -9.2 -0.25 -13.35 8.35 -0.25 -9.88
  [4,1,-8.09,-0.25,-9.88,-10,-0.25,-12,-9.2,-0.25,-13.35,8.35,-0.25,-9.88],
// 4 1 -18 -0.25 15 -18 -0.25 -15 -12.95 -0.25 -12.6 -12.95 -0.25 12.6
  [4,1,-18,-0.25,15,-18,-0.25,-15,-12.95,-0.25,-12.6,-12.95,-0.25,12.6],
// 4 1 -18 -0.25 15 -12.95 -0.25 12.6 -12.95 -0.25 16.35 -15 -0.25 18
  [4,1,-18,-0.25,15,-12.95,-0.25,12.6,-12.95,-0.25,16.35,-15,-0.25,18],
// 4 1 -18 -0.25 -15 -15 -0.25 -18 -12.95 -0.25 -16.35 -12.95 -0.25 -12.6
  [4,1,-18,-0.25,-15,-15,-0.25,-18,-12.95,-0.25,-16.35,-12.95,-0.25,-12.6],
// 4 1 2.44 -0.25 6.02 -2.15 -0.25 6.02 -2.15 -0.25 2.92 2.44 -0.25 2.92
  [4,1,2.44,-0.25,6.02,-2.15,-0.25,6.02,-2.15,-0.25,2.92,2.44,-0.25,2.92],
// 4 1 -15 -0.25 18 -12.95 -0.25 16.35 -9.2 -0.25 16.35 15 -0.25 18
  [4,1,-15,-0.25,18,-12.95,-0.25,16.35,-9.2,-0.25,16.35,15,-0.25,18],
// 4 1 -9.2 -0.25 -16.35 -15 -0.25 -18 15 -0.25 -18 9.2 -0.25 -16.35
  [4,1,-9.2,-0.25,-16.35,-15,-0.25,-18,15,-0.25,-18,9.2,-0.25,-16.35],
// 4 1 -8.06 -0.25 -3.98 -8.09 -0.25 2.92 -10 -0.25 -12 -8.09 -0.25 -9.88
  [4,1,-8.06,-0.25,-3.98,-8.09,-0.25,2.92,-10,-0.25,-12,-8.09,-0.25,-9.88],
// 4 1 12.95 -0.25 16.35 12.95 -0.25 12.6 18 -0.25 15 15 -0.25 18
  [4,1,12.95,-0.25,16.35,12.95,-0.25,12.6,18,-0.25,15,15,-0.25,18],
// 4 1 12.95 -0.25 -16.35 15 -0.25 -18 18 -0.25 -15 12.95 -0.25 -12.6
  [4,1,12.95,-0.25,-16.35,15,-0.25,-18,18,-0.25,-15,12.95,-0.25,-12.6],
// 4 1 12.95 -0.25 -12.6 18 -0.25 -15 18 -0.25 15 12.95 -0.25 12.6
  [4,1,12.95,-0.25,-12.6,18,-0.25,-15,18,-0.25,15,12.95,-0.25,12.6],
// 0 // Yellow
// 3 14 -3.59 -0.25 -5.32 -6.99 -0.25 -8.82 -3.59 -0.25 -6.38
  [3,14,-3.59,-0.25,-5.32,-6.99,-0.25,-8.82,-3.59,-0.25,-6.38],
// 3 14 3.51 -0.25 3.18 3.11 -0.25 2.16 7.19 -0.25 2.01
  [3,14,3.51,-0.25,3.18,3.11,-0.25,2.16,7.19,-0.25,2.01],
// 4 14 7.19 -0.25 2.01 7.19 -0.25 7.96 3.51 -0.25 7.1 3.51 -0.25 3.18
  [4,14,7.19,-0.25,2.01,7.19,-0.25,7.96,3.51,-0.25,7.1,3.51,-0.25,3.18],
// 4 14 -6.99 -0.25 3.98 -3.19 -0.25 3.98 -3.2 -0.25 7.1 -6.99 -0.25 7.96
  [4,14,-6.99,-0.25,3.98,-3.19,-0.25,3.98,-3.2,-0.25,7.1,-6.99,-0.25,7.96],
// 4 14 -5.08 -0.25 9.46 -6.99 -0.25 7.96 -3.2 -0.25 7.1 3.51 -0.25 7.1
  [4,14,-5.08,-0.25,9.46,-6.99,-0.25,7.96,-3.2,-0.25,7.1,3.51,-0.25,7.1],
// 4 14 5.12 -0.25 9.46 -5.08 -0.25 9.46 3.51 -0.25 7.1 7.19 -0.25 7.96
  [4,14,5.12,-0.25,9.46,-5.08,-0.25,9.46,3.51,-0.25,7.1,7.19,-0.25,7.96],
// 4 14 -2.96 -0.25 -4.39 7.19 -0.25 2.01 3.11 -0.25 2.16 -6.99 -0.25 -3.98
  [4,14,-2.96,-0.25,-4.39,7.19,-0.25,2.01,3.11,-0.25,2.16,-6.99,-0.25,-3.98],
// 4 14 10.7 -0.25 -12.6 12.2 -0.25 -12.6 12.2 -0.25 12.6 10.7 -0.25 12.6
  [4,14,10.7,-0.25,-12.6,12.2,-0.25,-12.6,12.2,-0.25,12.6,10.7,-0.25,12.6],
// 4 14 -12.2 -0.25 12.6 -12.2 -0.25 -12.6 -10.7 -0.25 -12.6 -10.7 -0.25 12.6
  [4,14,-12.2,-0.25,12.6,-12.2,-0.25,-12.6,-10.7,-0.25,-12.6,-10.7,-0.25,12.6],
// 4 14 9.2 -0.25 15.6 -9.2 -0.25 15.6 -9.2 -0.25 14.1 9.2 -0.25 14.1
  [4,14,9.2,-0.25,15.6,-9.2,-0.25,15.6,-9.2,-0.25,14.1,9.2,-0.25,14.1],
// 4 14 -3.59 -0.25 -5.32 -2.96 -0.25 -4.39 -6.99 -0.25 -3.98 -6.99 -0.25 -8.82
  [4,14,-3.59,-0.25,-5.32,-2.96,-0.25,-4.39,-6.99,-0.25,-3.98,-6.99,-0.25,-8.82],
// 4 14 7.34 -0.25 -6.38 -3.59 -0.25 -6.38 -6.99 -0.25 -8.82 7.34 -0.25 -8.82
  [4,14,7.34,-0.25,-6.38,-3.59,-0.25,-6.38,-6.99,-0.25,-8.82,7.34,-0.25,-8.82],
// 4 14 9.2 -0.25 -15.6 9.2 -0.25 -14.1 -9.2 -0.25 -14.1 -9.2 -0.25 -15.6
  [4,14,9.2,-0.25,-15.6,9.2,-0.25,-14.1,-9.2,-0.25,-14.1,-9.2,-0.25,-15.6],
];
module ldraw_lib__6237277b(step=0, col=false, unit=2/5, alt=false, line=0.2, solid=!$preview)
    makepoly(ldraw_lib__6237277b(), step=step, col=col, unit=unit, alt=alt, line=line, solid=solid);
ldraw_lib__6237277b(line=0.2);
